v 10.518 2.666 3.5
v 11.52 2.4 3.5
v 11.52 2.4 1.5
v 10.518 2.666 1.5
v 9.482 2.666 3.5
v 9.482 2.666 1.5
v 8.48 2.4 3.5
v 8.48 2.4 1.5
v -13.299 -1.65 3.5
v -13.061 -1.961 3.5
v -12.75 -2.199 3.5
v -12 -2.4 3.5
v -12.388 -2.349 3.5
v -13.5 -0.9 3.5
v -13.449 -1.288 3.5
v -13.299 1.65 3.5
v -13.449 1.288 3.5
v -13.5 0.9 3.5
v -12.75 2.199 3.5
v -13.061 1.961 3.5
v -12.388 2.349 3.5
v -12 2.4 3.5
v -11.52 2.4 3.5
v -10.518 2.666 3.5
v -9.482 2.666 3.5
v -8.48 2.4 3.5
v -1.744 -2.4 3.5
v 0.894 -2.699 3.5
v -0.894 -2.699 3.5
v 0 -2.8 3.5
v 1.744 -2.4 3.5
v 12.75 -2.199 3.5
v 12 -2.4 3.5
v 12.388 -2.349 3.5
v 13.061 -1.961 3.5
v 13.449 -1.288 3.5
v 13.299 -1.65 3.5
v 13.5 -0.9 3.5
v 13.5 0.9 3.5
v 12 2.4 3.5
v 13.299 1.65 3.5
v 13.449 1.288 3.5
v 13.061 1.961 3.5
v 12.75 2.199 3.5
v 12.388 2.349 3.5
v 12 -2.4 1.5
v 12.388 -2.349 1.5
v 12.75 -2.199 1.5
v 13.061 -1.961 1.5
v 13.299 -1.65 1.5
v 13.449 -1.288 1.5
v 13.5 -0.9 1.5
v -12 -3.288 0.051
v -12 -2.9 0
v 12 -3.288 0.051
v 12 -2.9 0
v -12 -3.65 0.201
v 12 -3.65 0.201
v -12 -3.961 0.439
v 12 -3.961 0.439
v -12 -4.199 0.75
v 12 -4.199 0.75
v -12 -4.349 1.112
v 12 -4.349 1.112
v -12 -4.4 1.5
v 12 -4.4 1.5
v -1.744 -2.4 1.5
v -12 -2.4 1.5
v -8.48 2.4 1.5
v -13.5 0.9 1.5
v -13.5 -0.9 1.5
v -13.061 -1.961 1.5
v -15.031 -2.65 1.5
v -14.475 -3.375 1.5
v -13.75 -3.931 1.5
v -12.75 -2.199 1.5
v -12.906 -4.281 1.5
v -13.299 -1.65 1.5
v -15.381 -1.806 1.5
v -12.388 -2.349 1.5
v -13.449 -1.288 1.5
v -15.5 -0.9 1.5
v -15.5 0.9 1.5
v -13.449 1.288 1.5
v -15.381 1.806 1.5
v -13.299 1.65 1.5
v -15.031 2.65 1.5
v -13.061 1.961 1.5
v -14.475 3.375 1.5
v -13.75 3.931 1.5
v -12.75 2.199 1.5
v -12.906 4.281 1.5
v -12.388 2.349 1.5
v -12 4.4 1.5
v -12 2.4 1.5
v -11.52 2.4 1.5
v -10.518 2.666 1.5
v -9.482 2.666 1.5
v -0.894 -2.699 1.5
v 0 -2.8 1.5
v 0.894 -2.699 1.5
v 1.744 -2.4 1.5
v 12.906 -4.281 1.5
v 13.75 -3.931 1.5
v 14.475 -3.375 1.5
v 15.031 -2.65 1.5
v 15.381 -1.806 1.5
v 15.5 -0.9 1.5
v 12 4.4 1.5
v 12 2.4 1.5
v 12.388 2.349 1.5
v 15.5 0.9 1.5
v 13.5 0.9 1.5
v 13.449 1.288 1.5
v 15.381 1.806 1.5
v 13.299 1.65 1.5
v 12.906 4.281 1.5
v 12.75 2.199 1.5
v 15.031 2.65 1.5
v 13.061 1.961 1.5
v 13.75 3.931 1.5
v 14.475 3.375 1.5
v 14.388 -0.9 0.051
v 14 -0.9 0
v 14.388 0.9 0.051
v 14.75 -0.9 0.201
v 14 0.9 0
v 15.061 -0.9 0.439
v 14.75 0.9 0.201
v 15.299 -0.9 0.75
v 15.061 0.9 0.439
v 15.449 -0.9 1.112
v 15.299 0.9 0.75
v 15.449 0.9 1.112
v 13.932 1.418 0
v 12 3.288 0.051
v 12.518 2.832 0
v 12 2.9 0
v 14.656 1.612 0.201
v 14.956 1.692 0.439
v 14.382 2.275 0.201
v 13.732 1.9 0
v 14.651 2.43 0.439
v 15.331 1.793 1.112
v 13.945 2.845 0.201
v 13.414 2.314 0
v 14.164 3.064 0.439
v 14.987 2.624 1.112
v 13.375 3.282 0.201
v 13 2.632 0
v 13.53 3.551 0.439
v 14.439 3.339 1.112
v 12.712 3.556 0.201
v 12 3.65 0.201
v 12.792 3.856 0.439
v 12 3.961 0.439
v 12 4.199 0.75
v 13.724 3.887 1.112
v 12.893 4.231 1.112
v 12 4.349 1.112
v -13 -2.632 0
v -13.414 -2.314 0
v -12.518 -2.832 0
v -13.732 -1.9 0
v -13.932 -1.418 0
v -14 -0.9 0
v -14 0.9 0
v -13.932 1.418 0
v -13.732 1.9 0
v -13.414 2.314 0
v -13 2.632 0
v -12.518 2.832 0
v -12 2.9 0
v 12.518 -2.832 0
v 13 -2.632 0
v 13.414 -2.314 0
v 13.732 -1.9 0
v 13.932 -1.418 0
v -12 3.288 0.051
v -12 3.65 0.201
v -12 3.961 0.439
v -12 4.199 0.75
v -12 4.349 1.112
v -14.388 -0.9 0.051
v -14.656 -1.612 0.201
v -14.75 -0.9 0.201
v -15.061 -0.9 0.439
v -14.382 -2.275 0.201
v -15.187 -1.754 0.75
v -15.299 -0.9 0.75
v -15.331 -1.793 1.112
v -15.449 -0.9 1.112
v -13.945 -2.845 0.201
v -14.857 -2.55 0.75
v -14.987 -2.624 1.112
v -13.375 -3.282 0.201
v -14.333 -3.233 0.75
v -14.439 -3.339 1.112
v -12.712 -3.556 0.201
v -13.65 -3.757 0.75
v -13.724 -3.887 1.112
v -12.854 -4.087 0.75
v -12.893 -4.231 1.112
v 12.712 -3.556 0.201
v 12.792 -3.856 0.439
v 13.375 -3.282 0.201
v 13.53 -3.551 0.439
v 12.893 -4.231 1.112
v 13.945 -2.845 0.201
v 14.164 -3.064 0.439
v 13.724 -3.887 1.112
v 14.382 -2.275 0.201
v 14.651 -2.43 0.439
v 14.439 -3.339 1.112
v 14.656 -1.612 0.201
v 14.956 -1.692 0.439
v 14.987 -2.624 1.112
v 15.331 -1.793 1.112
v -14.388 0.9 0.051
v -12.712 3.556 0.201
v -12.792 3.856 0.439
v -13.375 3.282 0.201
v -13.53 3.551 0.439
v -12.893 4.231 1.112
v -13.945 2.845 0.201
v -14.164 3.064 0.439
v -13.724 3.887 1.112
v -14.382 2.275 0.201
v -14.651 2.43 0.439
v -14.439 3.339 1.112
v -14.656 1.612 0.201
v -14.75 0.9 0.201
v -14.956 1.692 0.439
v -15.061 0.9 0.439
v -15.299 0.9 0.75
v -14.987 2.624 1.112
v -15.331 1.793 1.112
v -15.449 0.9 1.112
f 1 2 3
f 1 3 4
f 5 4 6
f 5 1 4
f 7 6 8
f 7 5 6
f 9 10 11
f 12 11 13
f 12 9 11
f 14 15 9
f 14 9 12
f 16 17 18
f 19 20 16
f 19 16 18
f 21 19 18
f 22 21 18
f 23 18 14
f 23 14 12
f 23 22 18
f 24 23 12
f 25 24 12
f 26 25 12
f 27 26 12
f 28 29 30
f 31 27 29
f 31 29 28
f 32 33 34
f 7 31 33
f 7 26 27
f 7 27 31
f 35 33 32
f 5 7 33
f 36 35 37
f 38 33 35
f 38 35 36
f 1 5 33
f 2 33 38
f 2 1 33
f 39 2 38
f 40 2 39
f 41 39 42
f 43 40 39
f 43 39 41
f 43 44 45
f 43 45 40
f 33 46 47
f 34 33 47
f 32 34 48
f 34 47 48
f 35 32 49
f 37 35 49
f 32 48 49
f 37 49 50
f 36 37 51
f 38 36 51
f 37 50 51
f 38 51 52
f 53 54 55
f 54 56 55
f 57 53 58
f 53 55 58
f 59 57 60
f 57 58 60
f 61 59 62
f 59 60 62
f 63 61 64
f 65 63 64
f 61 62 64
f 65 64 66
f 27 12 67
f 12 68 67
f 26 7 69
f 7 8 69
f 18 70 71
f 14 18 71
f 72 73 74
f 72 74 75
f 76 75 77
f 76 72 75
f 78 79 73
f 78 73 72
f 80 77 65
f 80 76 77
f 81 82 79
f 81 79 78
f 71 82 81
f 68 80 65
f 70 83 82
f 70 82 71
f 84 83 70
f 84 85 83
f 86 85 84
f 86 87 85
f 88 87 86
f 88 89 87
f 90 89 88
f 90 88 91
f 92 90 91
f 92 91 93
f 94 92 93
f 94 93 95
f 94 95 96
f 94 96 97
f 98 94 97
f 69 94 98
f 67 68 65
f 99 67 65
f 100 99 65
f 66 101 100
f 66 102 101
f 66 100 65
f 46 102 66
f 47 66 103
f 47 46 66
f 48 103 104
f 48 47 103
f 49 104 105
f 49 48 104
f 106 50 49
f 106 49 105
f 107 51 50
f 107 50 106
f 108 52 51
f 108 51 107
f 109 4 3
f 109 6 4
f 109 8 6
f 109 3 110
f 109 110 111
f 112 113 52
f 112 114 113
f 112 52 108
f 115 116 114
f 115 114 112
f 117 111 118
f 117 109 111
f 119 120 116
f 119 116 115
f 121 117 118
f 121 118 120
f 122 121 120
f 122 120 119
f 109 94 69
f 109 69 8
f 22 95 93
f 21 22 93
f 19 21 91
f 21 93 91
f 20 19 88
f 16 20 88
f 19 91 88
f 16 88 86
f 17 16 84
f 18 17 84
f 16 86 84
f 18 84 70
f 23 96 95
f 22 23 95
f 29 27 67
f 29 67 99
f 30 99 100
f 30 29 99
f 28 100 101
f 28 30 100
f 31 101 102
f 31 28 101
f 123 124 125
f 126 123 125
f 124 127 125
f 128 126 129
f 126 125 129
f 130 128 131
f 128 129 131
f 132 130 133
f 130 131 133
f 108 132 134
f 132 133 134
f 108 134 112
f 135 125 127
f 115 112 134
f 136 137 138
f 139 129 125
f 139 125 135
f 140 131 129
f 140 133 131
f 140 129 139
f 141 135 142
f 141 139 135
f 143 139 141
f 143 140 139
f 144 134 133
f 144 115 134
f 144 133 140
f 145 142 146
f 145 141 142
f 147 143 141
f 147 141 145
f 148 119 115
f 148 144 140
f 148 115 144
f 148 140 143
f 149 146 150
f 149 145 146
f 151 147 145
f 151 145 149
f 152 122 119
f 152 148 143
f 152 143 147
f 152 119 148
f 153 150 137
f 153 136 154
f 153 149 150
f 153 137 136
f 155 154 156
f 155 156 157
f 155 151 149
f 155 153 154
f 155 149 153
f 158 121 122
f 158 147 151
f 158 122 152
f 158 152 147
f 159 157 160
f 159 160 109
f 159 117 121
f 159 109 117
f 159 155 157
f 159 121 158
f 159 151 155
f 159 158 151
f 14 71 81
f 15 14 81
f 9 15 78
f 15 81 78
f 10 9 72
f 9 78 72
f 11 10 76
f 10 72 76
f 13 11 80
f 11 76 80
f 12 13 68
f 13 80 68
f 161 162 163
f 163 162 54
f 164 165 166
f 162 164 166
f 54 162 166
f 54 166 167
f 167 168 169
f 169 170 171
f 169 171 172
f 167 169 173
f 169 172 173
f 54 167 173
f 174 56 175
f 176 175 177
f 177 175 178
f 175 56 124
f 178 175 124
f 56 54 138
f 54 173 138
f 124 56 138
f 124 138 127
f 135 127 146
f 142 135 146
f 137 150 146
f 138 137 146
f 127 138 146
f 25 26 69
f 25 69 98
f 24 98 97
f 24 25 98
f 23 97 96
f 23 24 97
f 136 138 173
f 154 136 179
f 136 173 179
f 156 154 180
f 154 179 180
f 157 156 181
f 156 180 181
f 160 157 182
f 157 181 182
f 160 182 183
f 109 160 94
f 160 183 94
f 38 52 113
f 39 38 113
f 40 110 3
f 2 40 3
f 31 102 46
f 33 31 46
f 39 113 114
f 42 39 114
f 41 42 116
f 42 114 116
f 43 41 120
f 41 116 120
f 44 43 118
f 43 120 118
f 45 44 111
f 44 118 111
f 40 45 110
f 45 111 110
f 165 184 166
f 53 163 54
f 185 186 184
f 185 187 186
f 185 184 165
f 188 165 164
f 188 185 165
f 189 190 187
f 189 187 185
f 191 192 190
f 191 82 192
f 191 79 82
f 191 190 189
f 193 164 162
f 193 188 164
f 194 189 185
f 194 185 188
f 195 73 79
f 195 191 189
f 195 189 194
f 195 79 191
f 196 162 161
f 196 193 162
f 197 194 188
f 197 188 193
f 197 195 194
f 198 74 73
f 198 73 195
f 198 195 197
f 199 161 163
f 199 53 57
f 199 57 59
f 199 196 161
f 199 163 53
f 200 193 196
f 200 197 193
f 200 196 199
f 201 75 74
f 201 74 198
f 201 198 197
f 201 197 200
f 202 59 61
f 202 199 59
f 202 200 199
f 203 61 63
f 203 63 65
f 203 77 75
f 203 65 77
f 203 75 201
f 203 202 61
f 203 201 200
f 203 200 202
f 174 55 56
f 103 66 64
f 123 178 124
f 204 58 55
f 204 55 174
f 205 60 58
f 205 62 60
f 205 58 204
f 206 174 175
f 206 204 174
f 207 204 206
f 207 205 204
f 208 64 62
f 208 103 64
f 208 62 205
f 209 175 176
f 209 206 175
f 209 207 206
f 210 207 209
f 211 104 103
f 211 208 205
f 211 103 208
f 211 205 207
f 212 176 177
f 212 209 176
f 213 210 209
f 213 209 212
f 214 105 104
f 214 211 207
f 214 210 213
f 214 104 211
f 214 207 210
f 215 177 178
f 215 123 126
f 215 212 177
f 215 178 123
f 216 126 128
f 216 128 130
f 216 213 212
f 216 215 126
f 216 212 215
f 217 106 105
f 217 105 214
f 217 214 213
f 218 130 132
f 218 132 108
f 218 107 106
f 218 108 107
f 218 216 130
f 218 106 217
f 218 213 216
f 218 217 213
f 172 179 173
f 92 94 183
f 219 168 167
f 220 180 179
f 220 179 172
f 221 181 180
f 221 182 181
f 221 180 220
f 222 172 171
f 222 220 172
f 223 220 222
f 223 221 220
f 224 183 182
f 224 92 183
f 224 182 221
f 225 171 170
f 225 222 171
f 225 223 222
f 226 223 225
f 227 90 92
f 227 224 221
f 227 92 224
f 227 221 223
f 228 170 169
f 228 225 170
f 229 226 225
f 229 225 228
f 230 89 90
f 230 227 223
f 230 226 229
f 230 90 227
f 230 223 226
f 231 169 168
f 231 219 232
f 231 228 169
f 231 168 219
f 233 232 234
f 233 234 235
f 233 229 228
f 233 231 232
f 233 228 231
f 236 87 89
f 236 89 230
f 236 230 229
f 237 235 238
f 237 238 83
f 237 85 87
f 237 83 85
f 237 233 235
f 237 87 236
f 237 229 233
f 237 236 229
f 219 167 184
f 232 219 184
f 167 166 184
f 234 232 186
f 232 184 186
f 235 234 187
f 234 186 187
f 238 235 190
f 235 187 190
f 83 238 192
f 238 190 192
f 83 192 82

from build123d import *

# Parameters (mm, degrees)
F1_DEPTH = 1.5
F2_DEPTH = 3.5
F3_R     = 1.49999
F5_DEPTH = 2


# Not quite as in the source:
# - a fillet or chamfer is up to 0.001 mm smaller than in the source, because OpenCascade refuses the exact size


with BuildPart() as f1:
    # F0 (on Top) → F1 (new body)
    with BuildSketch(Plane.XY):
        with BuildLine():
            Line((15.5, -0.9), (15.5, 0.9))
            ThreePointArc((15.5, 0.9), (14.4748737342, 3.3748737342), (12, 4.4))
            Line((12, 4.4), (-12, 4.4))
            ThreePointArc((-12, 4.4), (-14.4748737342, 3.3748737342), (-15.5, 0.9))
            Line((-15.5, 0.9), (-15.5, -0.9))
            ThreePointArc((-15.5, -0.9), (-14.4748737342, -3.3748737342), (-12, -4.4))
            Line((-12, -4.4), (12, -4.4))
            ThreePointArc((12, -4.4), (14.4748737342, -3.3748737342), (15.5, -0.9))
        make_face()
        with BuildLine():
            ThreePointArc((13.5, -0.9), (13.0606601718, -1.9606601718), (12, -2.4))
            Line((12, -2.4), (-12, -2.4))
            ThreePointArc((-12, -2.4), (-13.0606601718, -1.9606601718), (-13.5, -0.9))
            Line((-13.5, -0.9), (-13.5, 0.9))
            ThreePointArc((-13.5, 0.9), (-13.0606601718, 1.9606601718), (-12, 2.4))
            Line((-12, 2.4), (12, 2.4))
            ThreePointArc((12, 2.4), (13.0606601718, 1.9606601718), (13.5, 0.9))
            Line((13.5, 0.9), (13.5, -0.9))
        make_face(mode=Mode.SUBTRACT)
        with BuildLine():
            Line((-12, -2.4), (12, -2.4))
            ThreePointArc((12, -2.4), (13.0606601718, -1.9606601718), (13.5, -0.9))
            Line((13.5, -0.9), (13.5, 0.9))
            ThreePointArc((13.5, 0.9), (13.0606601718, 1.9606601718), (12, 2.4))
            Line((12, 2.4), (-12, 2.4))
            ThreePointArc((-12, 2.4), (-13.0606601718, 1.9606601718), (-13.5, 0.9))
            Line((-13.5, 0.9), (-13.5, -0.9))
            ThreePointArc((-13.5, -0.9), (-13.0606601718, -1.9606601718), (-12, -2.4))
        make_face()
        with BuildLine():
            ThreePointArc((12, 1.6), (12.4949747468, 1.3949747468), (12.7, 0.9))
            Line((12.7, 0.9), (12.7, -0.9))
            ThreePointArc((12.7, -0.9), (12.4949747468, -1.3949747468), (12, -1.6))
            Line((12, -1.6), (-12, -1.6))
            ThreePointArc((-12, -1.6), (-12.4949747468, -1.3949747468), (-12.7, -0.9))
            Line((-12.7, -0.9), (-12.7, 0.9))
            ThreePointArc((-12.7, 0.9), (-12.4949747468, 1.3949747468), (-12, 1.6))
            Line((-12, 1.6), (12, 1.6))
        make_face(mode=Mode.SUBTRACT)
        with BuildLine():
            Line((12.7, -0.9), (12.7, 0.9))
            ThreePointArc((12.7, 0.9), (12.4949747468, 1.3949747468), (12, 1.6))
            Line((12, 1.6), (-12, 1.6))
            ThreePointArc((-12, 1.6), (-12.4949747468, 1.3949747468), (-12.7, 0.9))
            Line((-12.7, 0.9), (-12.7, -0.9))
            ThreePointArc((-12.7, -0.9), (-12.4949747468, -1.3949747468), (-12, -1.6))
            Line((-12, -1.6), (12, -1.6))
            ThreePointArc((12, -1.6), (12.4949747468, -1.3949747468), (12.7, -0.9))
        make_face()
    extrude(amount=F1_DEPTH)

    # F0 (on Top) → F2 (join)
    with BuildSketch(Plane.XY):
        with BuildLine():
            Line((-12, -2.4), (12, -2.4))
            ThreePointArc((12, -2.4), (13.0606601718, -1.9606601718), (13.5, -0.9))
            Line((13.5, -0.9), (13.5, 0.9))
            ThreePointArc((13.5, 0.9), (13.0606601718, 1.9606601718), (12, 2.4))
            Line((12, 2.4), (-12, 2.4))
            ThreePointArc((-12, 2.4), (-13.0606601718, 1.9606601718), (-13.5, 0.9))
            Line((-13.5, 0.9), (-13.5, -0.9))
            ThreePointArc((-13.5, -0.9), (-13.0606601718, -1.9606601718), (-12, -2.4))
        make_face()
        with BuildLine():
            ThreePointArc((12, 1.6), (12.4949747468, 1.3949747468), (12.7, 0.9))
            Line((12.7, 0.9), (12.7, -0.9))
            ThreePointArc((12.7, -0.9), (12.4949747468, -1.3949747468), (12, -1.6))
            Line((12, -1.6), (-12, -1.6))
            ThreePointArc((-12, -1.6), (-12.4949747468, -1.3949747468), (-12.7, -0.9))
            Line((-12.7, -0.9), (-12.7, 0.9))
            ThreePointArc((-12.7, 0.9), (-12.4949747468, 1.3949747468), (-12, 1.6))
            Line((-12, 1.6), (12, 1.6))
        make_face(mode=Mode.SUBTRACT)
        with BuildLine():
            Line((12.7, -0.9), (12.7, 0.9))
            ThreePointArc((12.7, 0.9), (12.4949747468, 1.3949747468), (12, 1.6))
            Line((12, 1.6), (-12, 1.6))
            ThreePointArc((-12, 1.6), (-12.4949747468, 1.3949747468), (-12.7, 0.9))
            Line((-12.7, 0.9), (-12.7, -0.9))
            ThreePointArc((-12.7, -0.9), (-12.4949747468, -1.3949747468), (-12, -1.6))
            Line((-12, -1.6), (12, -1.6))
            ThreePointArc((12, -1.6), (12.4949747468, -1.3949747468), (12.7, -0.9))
        make_face()
    extrude(amount=F2_DEPTH)

    # F3 (radius 1.5 in the source; OpenCascade refuses exactly that, so slightly less here)
    f3_edges = [f1.edges().sort_by_distance(p)[0] for p in [
        (0, -4.4, 0),
        (-14.474874, -3.374874, 0),
        (-15.5, 0, 0),
        (14.474874, -3.374874, 0),
        (15.5, 0, 0),
        (14.474874, 3.374874, 0),
        (0, 4.4, 0),
        (-14.474874, 3.374874, 0),
    ]]
    fillet(f3_edges, radius=F3_R)

    # F4 (on face) → F5 (join, through all)
    with BuildSketch(Plane.XY.offset(3.5)):
        with BuildLine():
            ThreePointArc((-6.1542230954, -2.4), (-6.0387434053, -1.8553793215), (-6, -1.3))
            ThreePointArc((-6, -1.3), (-6.6773900574, 0.9271648276), (-8.4801315846, 2.4))
            Line((-8.4801315846, 2.4), (-11.5198684154, 2.4))
            ThreePointArc((-11.5198684154, 2.4), (-12.6603120365, 1.6870955573), (-13.5, 0.6364916731))
            Line((-13.5, 0.6364916731), (-13.5, -0.9))
            ThreePointArc((-13.5, -0.9), (-13.0606601718, -1.9606601718), (-12, -2.4))
            Line((-12, -2.4), (-6.1542230954, -2.4))
        make_face()
        with BuildLine():
            Line((-11.5198684154, 2.4), (-8.4801315846, 2.4))
            ThreePointArc((-8.4801315846, 2.4), (-10, 2.7), (-11.5198684154, 2.4))
        make_face()
        with BuildLine():
            Line((3.8157568057, 2.4), (-3.8157568057, 2.4))
            ThreePointArc((-3.8157568057, 2.4), (-3.6723969913, -0.3854022638), (-1.7435595774, -2.4))
            Line((-1.7435595774, -2.4), (1.7435595774, -2.4))
            ThreePointArc((1.7435595774, -2.4), (3.3892652825, -0.9243542184), (4, 1.2))
            ThreePointArc((4, 1.2), (3.9536709033, 1.8070307971), (3.8157568057, 2.4))
        make_face()
        with BuildLine():
            Line((1.7435595774, -2.4), (-1.7435595774, -2.4))
            ThreePointArc((-1.7435595774, -2.4), (0, -2.8), (1.7435595774, -2.4))
        make_face()
        with BuildLine():
            ThreePointArc((11.5198684154, 2.4), (10, 2.7), (8.4801315846, 2.4))
            Line((8.4801315846, 2.4), (11.5198684154, 2.4))
        make_face()
    extrude(amount=-F5_DEPTH)


solid = f1.part
